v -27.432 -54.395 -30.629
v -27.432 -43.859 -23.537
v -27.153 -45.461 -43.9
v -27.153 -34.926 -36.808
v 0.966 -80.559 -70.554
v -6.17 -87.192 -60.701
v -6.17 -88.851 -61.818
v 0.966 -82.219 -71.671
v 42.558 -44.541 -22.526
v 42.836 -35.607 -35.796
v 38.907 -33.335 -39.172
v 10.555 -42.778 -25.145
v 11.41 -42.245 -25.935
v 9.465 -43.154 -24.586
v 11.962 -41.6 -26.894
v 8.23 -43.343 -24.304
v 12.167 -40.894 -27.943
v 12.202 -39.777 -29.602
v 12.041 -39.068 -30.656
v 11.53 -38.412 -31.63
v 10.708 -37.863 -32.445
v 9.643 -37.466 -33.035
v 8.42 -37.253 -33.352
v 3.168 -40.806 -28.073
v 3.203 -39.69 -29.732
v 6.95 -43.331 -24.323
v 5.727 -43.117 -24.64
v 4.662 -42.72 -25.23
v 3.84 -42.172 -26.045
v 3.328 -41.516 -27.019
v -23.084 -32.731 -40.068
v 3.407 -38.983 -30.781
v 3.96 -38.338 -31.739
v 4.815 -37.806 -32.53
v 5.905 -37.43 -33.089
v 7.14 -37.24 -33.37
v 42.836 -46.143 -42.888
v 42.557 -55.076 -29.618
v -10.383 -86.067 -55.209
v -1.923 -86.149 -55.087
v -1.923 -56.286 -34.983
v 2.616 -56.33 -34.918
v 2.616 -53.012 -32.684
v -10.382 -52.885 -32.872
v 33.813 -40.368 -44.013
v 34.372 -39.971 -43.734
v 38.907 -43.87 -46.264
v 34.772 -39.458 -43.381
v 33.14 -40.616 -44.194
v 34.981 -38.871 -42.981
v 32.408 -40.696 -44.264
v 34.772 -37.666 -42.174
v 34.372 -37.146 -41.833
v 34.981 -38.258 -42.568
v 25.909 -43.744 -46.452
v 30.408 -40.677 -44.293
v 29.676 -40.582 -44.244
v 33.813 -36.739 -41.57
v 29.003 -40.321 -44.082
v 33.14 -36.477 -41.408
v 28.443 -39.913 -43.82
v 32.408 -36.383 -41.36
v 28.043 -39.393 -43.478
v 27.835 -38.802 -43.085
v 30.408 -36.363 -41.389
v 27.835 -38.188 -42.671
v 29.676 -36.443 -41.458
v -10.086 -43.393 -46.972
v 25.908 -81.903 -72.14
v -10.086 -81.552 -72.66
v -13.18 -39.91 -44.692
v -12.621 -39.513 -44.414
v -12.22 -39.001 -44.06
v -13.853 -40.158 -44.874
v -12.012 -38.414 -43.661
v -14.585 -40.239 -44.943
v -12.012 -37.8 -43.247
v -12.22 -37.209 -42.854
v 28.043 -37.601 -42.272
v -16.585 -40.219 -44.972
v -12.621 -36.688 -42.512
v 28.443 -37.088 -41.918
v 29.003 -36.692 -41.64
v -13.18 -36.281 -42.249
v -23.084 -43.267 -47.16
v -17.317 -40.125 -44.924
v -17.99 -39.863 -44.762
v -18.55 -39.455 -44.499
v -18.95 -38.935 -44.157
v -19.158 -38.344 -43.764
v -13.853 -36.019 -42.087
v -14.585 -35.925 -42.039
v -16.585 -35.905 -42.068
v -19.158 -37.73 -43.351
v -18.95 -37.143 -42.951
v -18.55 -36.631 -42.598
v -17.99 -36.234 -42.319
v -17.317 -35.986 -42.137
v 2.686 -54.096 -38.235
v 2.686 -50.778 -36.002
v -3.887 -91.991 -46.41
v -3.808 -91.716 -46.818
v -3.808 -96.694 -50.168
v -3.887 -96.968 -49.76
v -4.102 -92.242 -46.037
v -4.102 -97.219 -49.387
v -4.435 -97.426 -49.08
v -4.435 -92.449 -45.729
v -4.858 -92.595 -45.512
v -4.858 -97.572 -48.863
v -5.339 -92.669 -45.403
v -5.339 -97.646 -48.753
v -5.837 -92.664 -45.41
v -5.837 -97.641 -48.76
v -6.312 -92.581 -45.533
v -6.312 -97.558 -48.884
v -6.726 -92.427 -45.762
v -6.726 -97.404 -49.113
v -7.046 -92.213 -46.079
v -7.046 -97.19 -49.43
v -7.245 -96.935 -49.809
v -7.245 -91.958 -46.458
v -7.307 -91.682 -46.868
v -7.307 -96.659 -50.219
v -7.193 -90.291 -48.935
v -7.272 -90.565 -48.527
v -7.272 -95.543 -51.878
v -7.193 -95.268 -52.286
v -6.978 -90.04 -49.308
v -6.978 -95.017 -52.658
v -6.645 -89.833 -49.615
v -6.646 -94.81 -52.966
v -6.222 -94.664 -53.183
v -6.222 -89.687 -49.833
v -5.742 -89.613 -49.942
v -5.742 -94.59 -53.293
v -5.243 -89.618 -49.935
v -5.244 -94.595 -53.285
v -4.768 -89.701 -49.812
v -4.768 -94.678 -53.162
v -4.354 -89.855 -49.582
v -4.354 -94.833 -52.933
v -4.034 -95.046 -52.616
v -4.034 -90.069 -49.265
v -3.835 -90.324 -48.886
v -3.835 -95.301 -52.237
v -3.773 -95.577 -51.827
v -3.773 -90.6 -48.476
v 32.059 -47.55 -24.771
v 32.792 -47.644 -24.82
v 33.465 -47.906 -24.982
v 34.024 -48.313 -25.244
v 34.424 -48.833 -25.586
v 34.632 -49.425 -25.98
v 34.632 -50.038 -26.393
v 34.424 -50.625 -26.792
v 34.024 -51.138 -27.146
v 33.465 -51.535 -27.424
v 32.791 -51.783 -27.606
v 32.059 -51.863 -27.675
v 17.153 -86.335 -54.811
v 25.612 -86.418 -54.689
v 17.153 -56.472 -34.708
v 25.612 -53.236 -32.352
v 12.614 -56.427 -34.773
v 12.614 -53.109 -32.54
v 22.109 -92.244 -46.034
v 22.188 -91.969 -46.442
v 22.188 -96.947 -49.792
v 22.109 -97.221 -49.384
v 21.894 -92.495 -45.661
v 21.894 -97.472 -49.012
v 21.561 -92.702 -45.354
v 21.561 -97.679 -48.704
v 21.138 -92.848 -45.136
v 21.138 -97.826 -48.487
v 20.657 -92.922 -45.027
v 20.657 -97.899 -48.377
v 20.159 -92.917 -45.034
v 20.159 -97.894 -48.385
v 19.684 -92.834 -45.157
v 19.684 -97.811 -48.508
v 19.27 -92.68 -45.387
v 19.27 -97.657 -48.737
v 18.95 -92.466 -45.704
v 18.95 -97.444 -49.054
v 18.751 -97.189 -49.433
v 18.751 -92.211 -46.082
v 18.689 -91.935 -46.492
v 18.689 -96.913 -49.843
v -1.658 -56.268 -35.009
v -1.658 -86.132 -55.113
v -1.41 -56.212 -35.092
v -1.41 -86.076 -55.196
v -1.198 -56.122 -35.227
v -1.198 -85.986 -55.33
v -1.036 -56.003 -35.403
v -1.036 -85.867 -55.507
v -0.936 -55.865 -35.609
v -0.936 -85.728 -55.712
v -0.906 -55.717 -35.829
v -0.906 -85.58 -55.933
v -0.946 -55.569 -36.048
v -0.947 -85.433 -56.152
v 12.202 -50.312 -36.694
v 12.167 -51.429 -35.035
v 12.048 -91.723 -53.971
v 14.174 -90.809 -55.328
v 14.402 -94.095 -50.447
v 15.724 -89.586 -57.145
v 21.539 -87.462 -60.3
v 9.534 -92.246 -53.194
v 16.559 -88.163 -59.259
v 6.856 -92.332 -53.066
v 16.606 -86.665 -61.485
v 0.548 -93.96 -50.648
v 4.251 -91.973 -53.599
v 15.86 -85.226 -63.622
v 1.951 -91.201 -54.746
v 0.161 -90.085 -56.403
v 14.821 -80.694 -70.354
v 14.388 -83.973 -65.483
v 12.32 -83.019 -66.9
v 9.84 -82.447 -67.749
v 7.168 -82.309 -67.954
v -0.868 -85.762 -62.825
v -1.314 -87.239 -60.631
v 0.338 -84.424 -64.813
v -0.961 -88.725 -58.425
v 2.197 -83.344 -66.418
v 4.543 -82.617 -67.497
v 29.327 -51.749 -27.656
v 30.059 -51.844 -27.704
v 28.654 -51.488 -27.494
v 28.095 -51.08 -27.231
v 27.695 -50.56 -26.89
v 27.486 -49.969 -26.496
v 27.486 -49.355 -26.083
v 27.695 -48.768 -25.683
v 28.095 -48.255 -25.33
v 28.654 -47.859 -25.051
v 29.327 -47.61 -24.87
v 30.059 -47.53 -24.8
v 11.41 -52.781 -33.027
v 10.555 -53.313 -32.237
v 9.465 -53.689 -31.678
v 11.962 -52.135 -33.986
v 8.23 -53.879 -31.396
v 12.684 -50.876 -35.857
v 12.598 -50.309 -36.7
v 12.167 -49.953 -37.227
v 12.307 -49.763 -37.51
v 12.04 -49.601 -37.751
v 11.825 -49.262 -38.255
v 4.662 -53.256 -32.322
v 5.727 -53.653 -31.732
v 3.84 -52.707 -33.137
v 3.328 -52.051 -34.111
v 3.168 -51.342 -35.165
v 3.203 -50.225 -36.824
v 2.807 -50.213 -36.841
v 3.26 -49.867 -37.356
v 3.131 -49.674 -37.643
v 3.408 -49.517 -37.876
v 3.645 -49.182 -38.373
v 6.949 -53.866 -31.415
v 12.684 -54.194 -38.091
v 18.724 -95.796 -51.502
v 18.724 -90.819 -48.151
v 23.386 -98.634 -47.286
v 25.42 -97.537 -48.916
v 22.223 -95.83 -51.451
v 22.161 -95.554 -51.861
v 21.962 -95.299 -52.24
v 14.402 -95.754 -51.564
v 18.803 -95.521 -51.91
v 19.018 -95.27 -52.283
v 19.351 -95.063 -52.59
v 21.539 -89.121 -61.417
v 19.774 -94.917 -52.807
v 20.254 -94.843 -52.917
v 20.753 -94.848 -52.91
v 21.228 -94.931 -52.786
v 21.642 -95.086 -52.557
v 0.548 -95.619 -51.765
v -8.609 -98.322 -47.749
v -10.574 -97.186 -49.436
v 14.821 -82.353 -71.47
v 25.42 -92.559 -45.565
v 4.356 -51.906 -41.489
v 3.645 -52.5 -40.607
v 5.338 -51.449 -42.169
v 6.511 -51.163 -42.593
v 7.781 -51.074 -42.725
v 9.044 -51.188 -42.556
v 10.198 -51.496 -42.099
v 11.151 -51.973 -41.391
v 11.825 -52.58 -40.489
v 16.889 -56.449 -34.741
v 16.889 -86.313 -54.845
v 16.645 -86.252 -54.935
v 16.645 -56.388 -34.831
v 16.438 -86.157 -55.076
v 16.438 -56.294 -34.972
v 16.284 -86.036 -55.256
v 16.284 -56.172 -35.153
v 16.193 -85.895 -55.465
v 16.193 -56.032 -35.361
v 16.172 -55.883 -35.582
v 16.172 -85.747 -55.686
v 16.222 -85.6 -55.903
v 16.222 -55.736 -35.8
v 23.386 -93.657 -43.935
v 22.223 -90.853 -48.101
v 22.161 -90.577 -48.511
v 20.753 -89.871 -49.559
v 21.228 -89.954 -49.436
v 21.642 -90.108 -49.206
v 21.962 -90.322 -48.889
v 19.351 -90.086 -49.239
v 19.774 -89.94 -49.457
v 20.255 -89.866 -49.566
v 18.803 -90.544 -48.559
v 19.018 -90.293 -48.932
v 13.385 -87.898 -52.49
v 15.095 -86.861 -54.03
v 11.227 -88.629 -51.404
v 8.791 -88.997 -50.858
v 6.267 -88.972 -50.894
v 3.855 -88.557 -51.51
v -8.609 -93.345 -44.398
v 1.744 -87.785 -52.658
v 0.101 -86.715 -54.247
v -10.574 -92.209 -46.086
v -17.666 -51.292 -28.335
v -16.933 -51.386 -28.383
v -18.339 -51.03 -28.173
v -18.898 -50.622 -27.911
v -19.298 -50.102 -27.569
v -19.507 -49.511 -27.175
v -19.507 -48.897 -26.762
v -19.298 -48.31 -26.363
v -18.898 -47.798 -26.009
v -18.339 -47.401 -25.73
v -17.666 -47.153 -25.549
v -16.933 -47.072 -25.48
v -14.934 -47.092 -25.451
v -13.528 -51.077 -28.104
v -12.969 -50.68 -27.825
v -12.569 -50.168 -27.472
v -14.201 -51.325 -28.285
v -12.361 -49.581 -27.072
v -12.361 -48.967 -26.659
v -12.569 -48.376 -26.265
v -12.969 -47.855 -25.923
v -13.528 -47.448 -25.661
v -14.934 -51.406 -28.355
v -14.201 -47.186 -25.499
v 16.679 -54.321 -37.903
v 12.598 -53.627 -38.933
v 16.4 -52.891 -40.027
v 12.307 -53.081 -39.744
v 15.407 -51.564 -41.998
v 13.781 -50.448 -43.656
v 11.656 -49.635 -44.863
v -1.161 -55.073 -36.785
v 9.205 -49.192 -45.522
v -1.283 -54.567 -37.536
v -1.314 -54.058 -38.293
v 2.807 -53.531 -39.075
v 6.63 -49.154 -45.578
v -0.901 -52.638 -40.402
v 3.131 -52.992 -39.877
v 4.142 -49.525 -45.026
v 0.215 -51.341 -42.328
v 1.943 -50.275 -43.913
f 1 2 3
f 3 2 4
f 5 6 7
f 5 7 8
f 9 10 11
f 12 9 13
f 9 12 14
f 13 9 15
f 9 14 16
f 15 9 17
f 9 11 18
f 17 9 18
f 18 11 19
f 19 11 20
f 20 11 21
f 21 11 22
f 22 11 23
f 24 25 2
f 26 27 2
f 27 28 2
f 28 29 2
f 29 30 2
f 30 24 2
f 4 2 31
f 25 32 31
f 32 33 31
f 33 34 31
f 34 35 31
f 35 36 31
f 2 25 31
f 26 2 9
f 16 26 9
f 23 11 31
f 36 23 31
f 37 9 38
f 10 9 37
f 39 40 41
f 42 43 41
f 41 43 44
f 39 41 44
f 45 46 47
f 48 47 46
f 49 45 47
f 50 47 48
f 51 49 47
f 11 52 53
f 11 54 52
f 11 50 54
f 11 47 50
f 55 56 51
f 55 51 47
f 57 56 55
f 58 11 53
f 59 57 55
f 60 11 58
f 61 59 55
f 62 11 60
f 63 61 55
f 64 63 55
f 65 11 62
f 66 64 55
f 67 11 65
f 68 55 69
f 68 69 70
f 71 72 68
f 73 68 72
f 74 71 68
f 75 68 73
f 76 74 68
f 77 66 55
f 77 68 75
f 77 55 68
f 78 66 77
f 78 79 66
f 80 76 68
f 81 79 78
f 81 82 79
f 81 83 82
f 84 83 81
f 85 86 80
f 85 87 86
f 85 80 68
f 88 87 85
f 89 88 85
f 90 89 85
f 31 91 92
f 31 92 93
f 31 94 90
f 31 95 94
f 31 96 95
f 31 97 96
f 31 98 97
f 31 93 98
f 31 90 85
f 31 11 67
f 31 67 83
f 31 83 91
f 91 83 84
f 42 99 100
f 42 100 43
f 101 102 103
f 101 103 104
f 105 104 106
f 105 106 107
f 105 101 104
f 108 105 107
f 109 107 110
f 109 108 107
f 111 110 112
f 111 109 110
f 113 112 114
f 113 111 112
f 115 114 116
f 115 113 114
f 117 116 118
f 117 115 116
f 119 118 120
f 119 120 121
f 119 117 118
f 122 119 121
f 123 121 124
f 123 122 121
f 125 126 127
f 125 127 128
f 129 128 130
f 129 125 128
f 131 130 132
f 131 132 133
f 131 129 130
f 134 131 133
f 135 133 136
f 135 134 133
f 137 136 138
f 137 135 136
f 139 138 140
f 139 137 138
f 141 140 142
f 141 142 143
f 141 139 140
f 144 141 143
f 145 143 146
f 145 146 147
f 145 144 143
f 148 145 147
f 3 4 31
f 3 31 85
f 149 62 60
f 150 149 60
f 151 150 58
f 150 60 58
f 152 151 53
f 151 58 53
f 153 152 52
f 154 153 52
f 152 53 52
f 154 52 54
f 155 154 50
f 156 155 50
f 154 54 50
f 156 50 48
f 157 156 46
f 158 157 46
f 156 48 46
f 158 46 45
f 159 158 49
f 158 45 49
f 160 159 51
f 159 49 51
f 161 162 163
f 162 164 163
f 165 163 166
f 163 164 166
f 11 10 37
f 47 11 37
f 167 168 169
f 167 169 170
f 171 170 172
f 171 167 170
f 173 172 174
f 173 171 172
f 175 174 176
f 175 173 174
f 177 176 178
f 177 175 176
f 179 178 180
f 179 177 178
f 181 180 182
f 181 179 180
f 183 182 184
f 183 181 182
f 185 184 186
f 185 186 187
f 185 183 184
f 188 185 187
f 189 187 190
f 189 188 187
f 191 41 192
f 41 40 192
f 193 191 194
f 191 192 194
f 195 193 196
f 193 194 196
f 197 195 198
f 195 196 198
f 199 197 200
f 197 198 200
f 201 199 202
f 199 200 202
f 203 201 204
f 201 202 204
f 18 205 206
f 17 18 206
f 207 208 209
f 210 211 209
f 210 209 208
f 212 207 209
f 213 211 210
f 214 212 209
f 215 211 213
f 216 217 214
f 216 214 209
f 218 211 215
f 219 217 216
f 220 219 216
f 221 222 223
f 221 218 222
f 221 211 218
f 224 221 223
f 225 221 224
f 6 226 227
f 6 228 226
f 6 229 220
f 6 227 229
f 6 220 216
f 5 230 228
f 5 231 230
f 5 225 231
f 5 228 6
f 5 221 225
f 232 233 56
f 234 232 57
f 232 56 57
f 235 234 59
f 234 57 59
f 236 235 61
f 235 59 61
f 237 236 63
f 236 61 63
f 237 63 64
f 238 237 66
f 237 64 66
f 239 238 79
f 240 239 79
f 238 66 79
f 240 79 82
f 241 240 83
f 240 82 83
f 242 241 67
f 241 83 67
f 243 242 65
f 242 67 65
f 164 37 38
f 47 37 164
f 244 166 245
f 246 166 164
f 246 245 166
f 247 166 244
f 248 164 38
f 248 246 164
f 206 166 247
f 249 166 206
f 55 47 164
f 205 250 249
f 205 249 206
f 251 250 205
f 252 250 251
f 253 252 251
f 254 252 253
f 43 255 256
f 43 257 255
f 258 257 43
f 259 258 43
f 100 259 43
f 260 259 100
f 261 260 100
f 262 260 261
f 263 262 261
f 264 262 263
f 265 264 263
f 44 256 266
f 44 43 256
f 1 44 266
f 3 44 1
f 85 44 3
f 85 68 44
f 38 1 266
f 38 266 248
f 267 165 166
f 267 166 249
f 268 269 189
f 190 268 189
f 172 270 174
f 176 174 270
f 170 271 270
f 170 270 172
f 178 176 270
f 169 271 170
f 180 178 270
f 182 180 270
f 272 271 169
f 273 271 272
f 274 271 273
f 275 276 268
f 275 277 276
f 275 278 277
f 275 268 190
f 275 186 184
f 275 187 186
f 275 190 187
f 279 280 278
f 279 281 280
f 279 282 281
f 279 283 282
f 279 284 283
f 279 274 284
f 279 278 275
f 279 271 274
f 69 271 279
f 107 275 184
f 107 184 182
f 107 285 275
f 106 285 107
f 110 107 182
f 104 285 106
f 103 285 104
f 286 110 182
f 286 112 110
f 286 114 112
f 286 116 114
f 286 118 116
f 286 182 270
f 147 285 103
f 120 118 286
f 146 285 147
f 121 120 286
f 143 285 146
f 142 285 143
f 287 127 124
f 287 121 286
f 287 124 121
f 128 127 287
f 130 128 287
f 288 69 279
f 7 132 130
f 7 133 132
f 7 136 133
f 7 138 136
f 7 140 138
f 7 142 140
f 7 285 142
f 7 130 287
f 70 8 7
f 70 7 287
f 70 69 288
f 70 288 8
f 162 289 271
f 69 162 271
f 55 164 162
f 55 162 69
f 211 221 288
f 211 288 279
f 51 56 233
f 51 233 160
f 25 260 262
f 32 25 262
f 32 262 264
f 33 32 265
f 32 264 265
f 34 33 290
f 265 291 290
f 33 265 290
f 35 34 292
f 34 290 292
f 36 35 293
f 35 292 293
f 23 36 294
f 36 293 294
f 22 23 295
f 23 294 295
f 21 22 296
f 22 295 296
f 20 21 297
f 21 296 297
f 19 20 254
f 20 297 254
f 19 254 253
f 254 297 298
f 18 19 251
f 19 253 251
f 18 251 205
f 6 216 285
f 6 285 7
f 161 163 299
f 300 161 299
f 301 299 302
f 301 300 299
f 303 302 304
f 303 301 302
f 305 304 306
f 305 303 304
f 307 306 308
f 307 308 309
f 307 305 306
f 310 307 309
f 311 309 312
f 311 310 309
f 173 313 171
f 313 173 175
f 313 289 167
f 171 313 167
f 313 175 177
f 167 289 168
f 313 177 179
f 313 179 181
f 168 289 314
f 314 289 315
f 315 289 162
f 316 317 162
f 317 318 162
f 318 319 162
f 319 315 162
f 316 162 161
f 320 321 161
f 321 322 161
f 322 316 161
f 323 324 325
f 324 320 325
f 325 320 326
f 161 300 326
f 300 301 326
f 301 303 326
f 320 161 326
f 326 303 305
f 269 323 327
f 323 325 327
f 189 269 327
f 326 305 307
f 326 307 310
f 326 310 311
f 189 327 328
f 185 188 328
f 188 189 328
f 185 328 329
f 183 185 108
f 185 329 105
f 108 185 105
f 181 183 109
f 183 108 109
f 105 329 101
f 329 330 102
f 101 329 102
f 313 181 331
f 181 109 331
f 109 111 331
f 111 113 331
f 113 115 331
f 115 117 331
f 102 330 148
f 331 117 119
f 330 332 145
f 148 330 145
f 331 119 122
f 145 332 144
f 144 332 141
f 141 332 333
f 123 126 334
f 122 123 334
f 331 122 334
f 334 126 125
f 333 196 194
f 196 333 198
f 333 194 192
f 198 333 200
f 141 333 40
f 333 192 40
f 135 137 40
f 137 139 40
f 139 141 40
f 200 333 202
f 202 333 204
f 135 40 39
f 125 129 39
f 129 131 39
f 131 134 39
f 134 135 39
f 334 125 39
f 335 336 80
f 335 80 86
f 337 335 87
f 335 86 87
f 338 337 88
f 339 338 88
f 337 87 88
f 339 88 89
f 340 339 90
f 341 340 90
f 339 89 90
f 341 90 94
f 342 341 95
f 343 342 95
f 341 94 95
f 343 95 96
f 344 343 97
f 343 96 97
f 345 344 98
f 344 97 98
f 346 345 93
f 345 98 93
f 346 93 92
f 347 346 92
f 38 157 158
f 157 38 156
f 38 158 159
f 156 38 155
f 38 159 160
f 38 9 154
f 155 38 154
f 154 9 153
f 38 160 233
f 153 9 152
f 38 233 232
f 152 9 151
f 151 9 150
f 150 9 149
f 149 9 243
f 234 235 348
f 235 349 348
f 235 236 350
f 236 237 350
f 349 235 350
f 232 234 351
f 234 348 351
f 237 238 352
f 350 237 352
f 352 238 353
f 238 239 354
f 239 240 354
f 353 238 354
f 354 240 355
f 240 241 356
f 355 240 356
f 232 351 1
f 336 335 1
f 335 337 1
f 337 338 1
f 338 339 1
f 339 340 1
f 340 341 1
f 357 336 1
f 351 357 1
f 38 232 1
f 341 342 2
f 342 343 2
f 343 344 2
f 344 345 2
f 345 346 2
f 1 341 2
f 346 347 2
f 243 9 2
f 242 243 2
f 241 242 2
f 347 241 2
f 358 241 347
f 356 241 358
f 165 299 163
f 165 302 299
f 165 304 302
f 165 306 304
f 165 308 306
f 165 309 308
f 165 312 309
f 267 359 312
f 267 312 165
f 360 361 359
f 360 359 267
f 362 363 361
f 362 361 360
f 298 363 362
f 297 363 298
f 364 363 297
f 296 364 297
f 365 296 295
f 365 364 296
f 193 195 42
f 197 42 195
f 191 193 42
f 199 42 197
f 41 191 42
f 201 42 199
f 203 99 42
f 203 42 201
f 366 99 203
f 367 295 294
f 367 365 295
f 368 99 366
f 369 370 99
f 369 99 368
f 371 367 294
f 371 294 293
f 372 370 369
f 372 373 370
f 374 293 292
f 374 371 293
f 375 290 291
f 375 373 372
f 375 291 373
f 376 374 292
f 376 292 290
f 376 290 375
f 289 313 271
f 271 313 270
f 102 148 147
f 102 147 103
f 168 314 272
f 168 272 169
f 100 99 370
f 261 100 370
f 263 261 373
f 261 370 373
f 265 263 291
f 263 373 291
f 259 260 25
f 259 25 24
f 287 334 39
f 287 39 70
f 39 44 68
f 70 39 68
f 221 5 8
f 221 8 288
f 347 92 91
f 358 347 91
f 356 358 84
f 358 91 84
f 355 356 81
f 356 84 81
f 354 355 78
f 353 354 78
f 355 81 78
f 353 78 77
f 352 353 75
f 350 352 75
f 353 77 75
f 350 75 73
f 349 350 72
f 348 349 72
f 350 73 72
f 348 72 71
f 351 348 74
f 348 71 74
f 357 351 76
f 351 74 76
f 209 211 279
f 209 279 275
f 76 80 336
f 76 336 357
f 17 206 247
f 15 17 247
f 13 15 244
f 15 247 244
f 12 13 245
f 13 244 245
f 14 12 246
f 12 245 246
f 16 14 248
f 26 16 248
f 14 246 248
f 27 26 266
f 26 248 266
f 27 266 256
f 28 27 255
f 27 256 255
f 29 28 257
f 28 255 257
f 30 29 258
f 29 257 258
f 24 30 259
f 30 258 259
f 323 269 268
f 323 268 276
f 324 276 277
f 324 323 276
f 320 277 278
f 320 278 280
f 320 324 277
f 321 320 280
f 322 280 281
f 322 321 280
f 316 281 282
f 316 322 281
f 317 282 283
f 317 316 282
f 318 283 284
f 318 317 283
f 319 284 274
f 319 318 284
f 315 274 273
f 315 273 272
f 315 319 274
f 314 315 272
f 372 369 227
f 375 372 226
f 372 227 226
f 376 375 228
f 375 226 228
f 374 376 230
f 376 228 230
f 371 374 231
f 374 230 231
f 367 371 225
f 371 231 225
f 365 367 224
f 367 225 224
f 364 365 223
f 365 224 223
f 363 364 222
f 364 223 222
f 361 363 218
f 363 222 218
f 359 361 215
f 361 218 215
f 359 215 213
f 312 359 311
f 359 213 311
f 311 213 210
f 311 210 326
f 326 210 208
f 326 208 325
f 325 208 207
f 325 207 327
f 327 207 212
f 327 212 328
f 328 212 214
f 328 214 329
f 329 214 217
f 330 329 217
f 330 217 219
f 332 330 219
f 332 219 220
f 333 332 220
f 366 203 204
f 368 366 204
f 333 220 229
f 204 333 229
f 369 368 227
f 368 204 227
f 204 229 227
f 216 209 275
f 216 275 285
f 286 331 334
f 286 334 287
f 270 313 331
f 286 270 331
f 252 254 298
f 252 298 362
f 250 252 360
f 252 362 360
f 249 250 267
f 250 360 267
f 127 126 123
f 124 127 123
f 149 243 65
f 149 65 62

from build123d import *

# Parameters (mm, degrees)
SKETCH029_W             = 70
SKETCH029_H             = 20
PAD005_DEPTH            = 12.7
SKETCH012_W             = 36
SKETCH012_H             = 17
PAD006_DEPTH            = 40
POCKET016_DEPTH         = 40
POCKET014_DEPTH         = 22.994766
SKETCH027_W             = 36
SKETCH027_H             = 30
PAD007_DEPTH            = 6
POCKET017_DEPTH         = 2
POCKET015_DEPTH         = 22
POCKET015_DEPTH_BACK    = 100
SKETCH013_R             = 9
POCKET018_DEPTH         = 40
FILLET_R                = 1
CHAMFER014_SIZE         = 2
CHAMFER013_SIZE         = 4
BODY002_ROLL_ANGLE      = -123.951696
BODY002_PITCH_ANGLE     = 0.828143
BODY002_PLACEMENT_ANGLE = 179.441913


with BuildPart() as part:
    # Sketch029 → Pad005 (new body)
    with BuildSketch(Plane.XY):
        with Locations((-8, 8)):
            Rectangle(SKETCH029_W, SKETCH029_H)
    extrude(amount=PAD005_DEPTH)

    # Sketch012 (on Face6 of Pad005) → Pad006 (join)
    with BuildSketch(Plane.XY.offset(12.7)):
        with Locations((-8, 9.5)):
            Rectangle(SKETCH012_W, SKETCH012_H)
    extrude(amount=PAD006_DEPTH)

    # Sketch028 → Pocket016 (cut)
    with BuildSketch(Plane.XY.offset(52.7)):
        with BuildLine():
            ThreePointArc((-3, 5), (-8, 10), (-13, 5))
            Line((-13, -7.39), (-13, 5))
            Line((-3, -7.39), (-13, -7.39))
            Line((-3, 5), (-3, -7.39))
        make_face()
    extrude(amount=-POCKET016_DEPTH, mode=Mode.SUBTRACT)

    # Sketch025 → Pocket014 (cut, through all)
    with BuildSketch(Plane(origin=(0, 20.993766, 0), x_dir=(-1, 0, 0), z_dir=(0, 1, 0))):
        with BuildLine():
            ThreePointArc((-16.5, 8.95), (-19.1, 6.35), (-16.5, 3.75))
            Line((-16.5, 3.75), (-14.5, 3.75))
            ThreePointArc((-14.5, 3.75), (-11.9, 6.35), (-14.5, 8.95))
            Line((-16.5, 8.95), (-14.5, 8.95))
        make_face()
        with BuildLine():
            ThreePointArc((30.5, 8.95), (27.9, 6.35), (30.5, 3.75))
            Line((30.5, 3.75), (32.5, 3.75))
            ThreePointArc((32.5, 3.75), (35.1, 6.35), (32.5, 8.95))
            Line((30.5, 8.95), (32.5, 8.95))
        make_face()
    extrude(amount=-POCKET014_DEPTH, mode=Mode.SUBTRACT)

    # Sketch027 → Pad007 (join)
    with BuildSketch(Plane.XY.offset(52.7)):
        with Locations((-8, 3)):
            Rectangle(SKETCH027_W, SKETCH027_H)
        with BuildLine():
            ThreePointArc((-19.25, -7), (-21, -5.25), (-22.75, -7))
            Line((-22.75, -7), (-22.75, -9))
            ThreePointArc((-22.75, -9), (-21, -10.75), (-19.25, -9))
            Line((-19.25, -7), (-19.25, -9))
        make_face(mode=Mode.SUBTRACT)
        with BuildLine():
            ThreePointArc((6.75, -7), (5, -5.25), (3.25, -7))
            Line((3.25, -7), (3.25, -9))
            ThreePointArc((3.25, -9), (5, -10.75), (6.75, -9))
            Line((6.75, -7), (6.75, -9))
        make_face(mode=Mode.SUBTRACT)
    extrude(amount=PAD007_DEPTH)

    # Sketch026 → Pocket017 (cut)
    with BuildSketch(Plane.XY.offset(56.7)):
        Polygon((5.856406, 5), (-1.071797, 17), (-14.928203, 17), (-21.856406, 5), (-14.928203, -7), (-1.071797, -7), align=None)
    extrude(amount=POCKET017_DEPTH, mode=Mode.SUBTRACT)

    # Sketch030 → Pocket015 (cut, two sides)
    with BuildSketch(Plane.XY.offset(12.7)) as pocket015_sk:
        with BuildLine():
            ThreePointArc((-3.5, 6), (-8, 10.5), (-12.5, 6))
            Line((-12.5, 6), (-12.5, 4))
            ThreePointArc((-12.5, 4), (-8, -0.5), (-3.5, 4))
            Line((-3.5, 6), (-3.5, 4))
        make_face()
    extrude(amount=-POCKET015_DEPTH, mode=Mode.SUBTRACT)
    extrude(pocket015_sk.sketch, amount=POCKET015_DEPTH_BACK, mode=Mode.SUBTRACT)

    # Sketch013 (on Face29 of Pocket015) → Pocket018 (cut)
    with BuildSketch(Plane.XY.offset(56.7)):
        with Locations((-8, 5)):
            Circle(SKETCH013_R)
    extrude(amount=-POCKET018_DEPTH, mode=Mode.SUBTRACT)

    # Fillet
    fillet_edges = [part.edges().sort_by_distance(p)[0] for p in [
        (0.062258, 1, 34.7),
        (-16.062258, 1, 34.7),
    ]]
    fillet(fillet_edges, radius=FILLET_R)

    # Chamfer014
    chamfer014_edges = [part.edges().sort_by_distance(p)[0] for p in [
        (10, -12, 55.7),
        (-26, -12, 55.7),
    ]]
    chamfer(chamfer014_edges, length=CHAMFER014_SIZE)

    # Chamfer013
    chamfer013_edges = [part.edges().sort_by_distance(p)[0] for p in [
        (-43, 18, 6.35),
        (27, 18, 6.35),
    ]]
    chamfer(chamfer013_edges, length=CHAMFER013_SIZE)


with BuildPart() as part_1:
    # Body002 roll: moved
    add(part.part.rotate(Axis((0, 0, 0), (1, 0, 0)), BODY002_ROLL_ANGLE))


with BuildPart() as part_2:
    # Body002 pitch: moved
    add(part_1.part.rotate(Axis((0, 0, 0), (0, 1, 0)), BODY002_PITCH_ANGLE))


with BuildPart() as part_3:
    # Body002 placement: moved
    add(part_2.part.moved(Location((-0.401038, -43.00558, -24.805855))).rotate(Axis((-0.401038, -43.00558, -24.805855), (0, 0, 1)), BODY002_PLACEMENT_ANGLE))


solid = part_3.part
